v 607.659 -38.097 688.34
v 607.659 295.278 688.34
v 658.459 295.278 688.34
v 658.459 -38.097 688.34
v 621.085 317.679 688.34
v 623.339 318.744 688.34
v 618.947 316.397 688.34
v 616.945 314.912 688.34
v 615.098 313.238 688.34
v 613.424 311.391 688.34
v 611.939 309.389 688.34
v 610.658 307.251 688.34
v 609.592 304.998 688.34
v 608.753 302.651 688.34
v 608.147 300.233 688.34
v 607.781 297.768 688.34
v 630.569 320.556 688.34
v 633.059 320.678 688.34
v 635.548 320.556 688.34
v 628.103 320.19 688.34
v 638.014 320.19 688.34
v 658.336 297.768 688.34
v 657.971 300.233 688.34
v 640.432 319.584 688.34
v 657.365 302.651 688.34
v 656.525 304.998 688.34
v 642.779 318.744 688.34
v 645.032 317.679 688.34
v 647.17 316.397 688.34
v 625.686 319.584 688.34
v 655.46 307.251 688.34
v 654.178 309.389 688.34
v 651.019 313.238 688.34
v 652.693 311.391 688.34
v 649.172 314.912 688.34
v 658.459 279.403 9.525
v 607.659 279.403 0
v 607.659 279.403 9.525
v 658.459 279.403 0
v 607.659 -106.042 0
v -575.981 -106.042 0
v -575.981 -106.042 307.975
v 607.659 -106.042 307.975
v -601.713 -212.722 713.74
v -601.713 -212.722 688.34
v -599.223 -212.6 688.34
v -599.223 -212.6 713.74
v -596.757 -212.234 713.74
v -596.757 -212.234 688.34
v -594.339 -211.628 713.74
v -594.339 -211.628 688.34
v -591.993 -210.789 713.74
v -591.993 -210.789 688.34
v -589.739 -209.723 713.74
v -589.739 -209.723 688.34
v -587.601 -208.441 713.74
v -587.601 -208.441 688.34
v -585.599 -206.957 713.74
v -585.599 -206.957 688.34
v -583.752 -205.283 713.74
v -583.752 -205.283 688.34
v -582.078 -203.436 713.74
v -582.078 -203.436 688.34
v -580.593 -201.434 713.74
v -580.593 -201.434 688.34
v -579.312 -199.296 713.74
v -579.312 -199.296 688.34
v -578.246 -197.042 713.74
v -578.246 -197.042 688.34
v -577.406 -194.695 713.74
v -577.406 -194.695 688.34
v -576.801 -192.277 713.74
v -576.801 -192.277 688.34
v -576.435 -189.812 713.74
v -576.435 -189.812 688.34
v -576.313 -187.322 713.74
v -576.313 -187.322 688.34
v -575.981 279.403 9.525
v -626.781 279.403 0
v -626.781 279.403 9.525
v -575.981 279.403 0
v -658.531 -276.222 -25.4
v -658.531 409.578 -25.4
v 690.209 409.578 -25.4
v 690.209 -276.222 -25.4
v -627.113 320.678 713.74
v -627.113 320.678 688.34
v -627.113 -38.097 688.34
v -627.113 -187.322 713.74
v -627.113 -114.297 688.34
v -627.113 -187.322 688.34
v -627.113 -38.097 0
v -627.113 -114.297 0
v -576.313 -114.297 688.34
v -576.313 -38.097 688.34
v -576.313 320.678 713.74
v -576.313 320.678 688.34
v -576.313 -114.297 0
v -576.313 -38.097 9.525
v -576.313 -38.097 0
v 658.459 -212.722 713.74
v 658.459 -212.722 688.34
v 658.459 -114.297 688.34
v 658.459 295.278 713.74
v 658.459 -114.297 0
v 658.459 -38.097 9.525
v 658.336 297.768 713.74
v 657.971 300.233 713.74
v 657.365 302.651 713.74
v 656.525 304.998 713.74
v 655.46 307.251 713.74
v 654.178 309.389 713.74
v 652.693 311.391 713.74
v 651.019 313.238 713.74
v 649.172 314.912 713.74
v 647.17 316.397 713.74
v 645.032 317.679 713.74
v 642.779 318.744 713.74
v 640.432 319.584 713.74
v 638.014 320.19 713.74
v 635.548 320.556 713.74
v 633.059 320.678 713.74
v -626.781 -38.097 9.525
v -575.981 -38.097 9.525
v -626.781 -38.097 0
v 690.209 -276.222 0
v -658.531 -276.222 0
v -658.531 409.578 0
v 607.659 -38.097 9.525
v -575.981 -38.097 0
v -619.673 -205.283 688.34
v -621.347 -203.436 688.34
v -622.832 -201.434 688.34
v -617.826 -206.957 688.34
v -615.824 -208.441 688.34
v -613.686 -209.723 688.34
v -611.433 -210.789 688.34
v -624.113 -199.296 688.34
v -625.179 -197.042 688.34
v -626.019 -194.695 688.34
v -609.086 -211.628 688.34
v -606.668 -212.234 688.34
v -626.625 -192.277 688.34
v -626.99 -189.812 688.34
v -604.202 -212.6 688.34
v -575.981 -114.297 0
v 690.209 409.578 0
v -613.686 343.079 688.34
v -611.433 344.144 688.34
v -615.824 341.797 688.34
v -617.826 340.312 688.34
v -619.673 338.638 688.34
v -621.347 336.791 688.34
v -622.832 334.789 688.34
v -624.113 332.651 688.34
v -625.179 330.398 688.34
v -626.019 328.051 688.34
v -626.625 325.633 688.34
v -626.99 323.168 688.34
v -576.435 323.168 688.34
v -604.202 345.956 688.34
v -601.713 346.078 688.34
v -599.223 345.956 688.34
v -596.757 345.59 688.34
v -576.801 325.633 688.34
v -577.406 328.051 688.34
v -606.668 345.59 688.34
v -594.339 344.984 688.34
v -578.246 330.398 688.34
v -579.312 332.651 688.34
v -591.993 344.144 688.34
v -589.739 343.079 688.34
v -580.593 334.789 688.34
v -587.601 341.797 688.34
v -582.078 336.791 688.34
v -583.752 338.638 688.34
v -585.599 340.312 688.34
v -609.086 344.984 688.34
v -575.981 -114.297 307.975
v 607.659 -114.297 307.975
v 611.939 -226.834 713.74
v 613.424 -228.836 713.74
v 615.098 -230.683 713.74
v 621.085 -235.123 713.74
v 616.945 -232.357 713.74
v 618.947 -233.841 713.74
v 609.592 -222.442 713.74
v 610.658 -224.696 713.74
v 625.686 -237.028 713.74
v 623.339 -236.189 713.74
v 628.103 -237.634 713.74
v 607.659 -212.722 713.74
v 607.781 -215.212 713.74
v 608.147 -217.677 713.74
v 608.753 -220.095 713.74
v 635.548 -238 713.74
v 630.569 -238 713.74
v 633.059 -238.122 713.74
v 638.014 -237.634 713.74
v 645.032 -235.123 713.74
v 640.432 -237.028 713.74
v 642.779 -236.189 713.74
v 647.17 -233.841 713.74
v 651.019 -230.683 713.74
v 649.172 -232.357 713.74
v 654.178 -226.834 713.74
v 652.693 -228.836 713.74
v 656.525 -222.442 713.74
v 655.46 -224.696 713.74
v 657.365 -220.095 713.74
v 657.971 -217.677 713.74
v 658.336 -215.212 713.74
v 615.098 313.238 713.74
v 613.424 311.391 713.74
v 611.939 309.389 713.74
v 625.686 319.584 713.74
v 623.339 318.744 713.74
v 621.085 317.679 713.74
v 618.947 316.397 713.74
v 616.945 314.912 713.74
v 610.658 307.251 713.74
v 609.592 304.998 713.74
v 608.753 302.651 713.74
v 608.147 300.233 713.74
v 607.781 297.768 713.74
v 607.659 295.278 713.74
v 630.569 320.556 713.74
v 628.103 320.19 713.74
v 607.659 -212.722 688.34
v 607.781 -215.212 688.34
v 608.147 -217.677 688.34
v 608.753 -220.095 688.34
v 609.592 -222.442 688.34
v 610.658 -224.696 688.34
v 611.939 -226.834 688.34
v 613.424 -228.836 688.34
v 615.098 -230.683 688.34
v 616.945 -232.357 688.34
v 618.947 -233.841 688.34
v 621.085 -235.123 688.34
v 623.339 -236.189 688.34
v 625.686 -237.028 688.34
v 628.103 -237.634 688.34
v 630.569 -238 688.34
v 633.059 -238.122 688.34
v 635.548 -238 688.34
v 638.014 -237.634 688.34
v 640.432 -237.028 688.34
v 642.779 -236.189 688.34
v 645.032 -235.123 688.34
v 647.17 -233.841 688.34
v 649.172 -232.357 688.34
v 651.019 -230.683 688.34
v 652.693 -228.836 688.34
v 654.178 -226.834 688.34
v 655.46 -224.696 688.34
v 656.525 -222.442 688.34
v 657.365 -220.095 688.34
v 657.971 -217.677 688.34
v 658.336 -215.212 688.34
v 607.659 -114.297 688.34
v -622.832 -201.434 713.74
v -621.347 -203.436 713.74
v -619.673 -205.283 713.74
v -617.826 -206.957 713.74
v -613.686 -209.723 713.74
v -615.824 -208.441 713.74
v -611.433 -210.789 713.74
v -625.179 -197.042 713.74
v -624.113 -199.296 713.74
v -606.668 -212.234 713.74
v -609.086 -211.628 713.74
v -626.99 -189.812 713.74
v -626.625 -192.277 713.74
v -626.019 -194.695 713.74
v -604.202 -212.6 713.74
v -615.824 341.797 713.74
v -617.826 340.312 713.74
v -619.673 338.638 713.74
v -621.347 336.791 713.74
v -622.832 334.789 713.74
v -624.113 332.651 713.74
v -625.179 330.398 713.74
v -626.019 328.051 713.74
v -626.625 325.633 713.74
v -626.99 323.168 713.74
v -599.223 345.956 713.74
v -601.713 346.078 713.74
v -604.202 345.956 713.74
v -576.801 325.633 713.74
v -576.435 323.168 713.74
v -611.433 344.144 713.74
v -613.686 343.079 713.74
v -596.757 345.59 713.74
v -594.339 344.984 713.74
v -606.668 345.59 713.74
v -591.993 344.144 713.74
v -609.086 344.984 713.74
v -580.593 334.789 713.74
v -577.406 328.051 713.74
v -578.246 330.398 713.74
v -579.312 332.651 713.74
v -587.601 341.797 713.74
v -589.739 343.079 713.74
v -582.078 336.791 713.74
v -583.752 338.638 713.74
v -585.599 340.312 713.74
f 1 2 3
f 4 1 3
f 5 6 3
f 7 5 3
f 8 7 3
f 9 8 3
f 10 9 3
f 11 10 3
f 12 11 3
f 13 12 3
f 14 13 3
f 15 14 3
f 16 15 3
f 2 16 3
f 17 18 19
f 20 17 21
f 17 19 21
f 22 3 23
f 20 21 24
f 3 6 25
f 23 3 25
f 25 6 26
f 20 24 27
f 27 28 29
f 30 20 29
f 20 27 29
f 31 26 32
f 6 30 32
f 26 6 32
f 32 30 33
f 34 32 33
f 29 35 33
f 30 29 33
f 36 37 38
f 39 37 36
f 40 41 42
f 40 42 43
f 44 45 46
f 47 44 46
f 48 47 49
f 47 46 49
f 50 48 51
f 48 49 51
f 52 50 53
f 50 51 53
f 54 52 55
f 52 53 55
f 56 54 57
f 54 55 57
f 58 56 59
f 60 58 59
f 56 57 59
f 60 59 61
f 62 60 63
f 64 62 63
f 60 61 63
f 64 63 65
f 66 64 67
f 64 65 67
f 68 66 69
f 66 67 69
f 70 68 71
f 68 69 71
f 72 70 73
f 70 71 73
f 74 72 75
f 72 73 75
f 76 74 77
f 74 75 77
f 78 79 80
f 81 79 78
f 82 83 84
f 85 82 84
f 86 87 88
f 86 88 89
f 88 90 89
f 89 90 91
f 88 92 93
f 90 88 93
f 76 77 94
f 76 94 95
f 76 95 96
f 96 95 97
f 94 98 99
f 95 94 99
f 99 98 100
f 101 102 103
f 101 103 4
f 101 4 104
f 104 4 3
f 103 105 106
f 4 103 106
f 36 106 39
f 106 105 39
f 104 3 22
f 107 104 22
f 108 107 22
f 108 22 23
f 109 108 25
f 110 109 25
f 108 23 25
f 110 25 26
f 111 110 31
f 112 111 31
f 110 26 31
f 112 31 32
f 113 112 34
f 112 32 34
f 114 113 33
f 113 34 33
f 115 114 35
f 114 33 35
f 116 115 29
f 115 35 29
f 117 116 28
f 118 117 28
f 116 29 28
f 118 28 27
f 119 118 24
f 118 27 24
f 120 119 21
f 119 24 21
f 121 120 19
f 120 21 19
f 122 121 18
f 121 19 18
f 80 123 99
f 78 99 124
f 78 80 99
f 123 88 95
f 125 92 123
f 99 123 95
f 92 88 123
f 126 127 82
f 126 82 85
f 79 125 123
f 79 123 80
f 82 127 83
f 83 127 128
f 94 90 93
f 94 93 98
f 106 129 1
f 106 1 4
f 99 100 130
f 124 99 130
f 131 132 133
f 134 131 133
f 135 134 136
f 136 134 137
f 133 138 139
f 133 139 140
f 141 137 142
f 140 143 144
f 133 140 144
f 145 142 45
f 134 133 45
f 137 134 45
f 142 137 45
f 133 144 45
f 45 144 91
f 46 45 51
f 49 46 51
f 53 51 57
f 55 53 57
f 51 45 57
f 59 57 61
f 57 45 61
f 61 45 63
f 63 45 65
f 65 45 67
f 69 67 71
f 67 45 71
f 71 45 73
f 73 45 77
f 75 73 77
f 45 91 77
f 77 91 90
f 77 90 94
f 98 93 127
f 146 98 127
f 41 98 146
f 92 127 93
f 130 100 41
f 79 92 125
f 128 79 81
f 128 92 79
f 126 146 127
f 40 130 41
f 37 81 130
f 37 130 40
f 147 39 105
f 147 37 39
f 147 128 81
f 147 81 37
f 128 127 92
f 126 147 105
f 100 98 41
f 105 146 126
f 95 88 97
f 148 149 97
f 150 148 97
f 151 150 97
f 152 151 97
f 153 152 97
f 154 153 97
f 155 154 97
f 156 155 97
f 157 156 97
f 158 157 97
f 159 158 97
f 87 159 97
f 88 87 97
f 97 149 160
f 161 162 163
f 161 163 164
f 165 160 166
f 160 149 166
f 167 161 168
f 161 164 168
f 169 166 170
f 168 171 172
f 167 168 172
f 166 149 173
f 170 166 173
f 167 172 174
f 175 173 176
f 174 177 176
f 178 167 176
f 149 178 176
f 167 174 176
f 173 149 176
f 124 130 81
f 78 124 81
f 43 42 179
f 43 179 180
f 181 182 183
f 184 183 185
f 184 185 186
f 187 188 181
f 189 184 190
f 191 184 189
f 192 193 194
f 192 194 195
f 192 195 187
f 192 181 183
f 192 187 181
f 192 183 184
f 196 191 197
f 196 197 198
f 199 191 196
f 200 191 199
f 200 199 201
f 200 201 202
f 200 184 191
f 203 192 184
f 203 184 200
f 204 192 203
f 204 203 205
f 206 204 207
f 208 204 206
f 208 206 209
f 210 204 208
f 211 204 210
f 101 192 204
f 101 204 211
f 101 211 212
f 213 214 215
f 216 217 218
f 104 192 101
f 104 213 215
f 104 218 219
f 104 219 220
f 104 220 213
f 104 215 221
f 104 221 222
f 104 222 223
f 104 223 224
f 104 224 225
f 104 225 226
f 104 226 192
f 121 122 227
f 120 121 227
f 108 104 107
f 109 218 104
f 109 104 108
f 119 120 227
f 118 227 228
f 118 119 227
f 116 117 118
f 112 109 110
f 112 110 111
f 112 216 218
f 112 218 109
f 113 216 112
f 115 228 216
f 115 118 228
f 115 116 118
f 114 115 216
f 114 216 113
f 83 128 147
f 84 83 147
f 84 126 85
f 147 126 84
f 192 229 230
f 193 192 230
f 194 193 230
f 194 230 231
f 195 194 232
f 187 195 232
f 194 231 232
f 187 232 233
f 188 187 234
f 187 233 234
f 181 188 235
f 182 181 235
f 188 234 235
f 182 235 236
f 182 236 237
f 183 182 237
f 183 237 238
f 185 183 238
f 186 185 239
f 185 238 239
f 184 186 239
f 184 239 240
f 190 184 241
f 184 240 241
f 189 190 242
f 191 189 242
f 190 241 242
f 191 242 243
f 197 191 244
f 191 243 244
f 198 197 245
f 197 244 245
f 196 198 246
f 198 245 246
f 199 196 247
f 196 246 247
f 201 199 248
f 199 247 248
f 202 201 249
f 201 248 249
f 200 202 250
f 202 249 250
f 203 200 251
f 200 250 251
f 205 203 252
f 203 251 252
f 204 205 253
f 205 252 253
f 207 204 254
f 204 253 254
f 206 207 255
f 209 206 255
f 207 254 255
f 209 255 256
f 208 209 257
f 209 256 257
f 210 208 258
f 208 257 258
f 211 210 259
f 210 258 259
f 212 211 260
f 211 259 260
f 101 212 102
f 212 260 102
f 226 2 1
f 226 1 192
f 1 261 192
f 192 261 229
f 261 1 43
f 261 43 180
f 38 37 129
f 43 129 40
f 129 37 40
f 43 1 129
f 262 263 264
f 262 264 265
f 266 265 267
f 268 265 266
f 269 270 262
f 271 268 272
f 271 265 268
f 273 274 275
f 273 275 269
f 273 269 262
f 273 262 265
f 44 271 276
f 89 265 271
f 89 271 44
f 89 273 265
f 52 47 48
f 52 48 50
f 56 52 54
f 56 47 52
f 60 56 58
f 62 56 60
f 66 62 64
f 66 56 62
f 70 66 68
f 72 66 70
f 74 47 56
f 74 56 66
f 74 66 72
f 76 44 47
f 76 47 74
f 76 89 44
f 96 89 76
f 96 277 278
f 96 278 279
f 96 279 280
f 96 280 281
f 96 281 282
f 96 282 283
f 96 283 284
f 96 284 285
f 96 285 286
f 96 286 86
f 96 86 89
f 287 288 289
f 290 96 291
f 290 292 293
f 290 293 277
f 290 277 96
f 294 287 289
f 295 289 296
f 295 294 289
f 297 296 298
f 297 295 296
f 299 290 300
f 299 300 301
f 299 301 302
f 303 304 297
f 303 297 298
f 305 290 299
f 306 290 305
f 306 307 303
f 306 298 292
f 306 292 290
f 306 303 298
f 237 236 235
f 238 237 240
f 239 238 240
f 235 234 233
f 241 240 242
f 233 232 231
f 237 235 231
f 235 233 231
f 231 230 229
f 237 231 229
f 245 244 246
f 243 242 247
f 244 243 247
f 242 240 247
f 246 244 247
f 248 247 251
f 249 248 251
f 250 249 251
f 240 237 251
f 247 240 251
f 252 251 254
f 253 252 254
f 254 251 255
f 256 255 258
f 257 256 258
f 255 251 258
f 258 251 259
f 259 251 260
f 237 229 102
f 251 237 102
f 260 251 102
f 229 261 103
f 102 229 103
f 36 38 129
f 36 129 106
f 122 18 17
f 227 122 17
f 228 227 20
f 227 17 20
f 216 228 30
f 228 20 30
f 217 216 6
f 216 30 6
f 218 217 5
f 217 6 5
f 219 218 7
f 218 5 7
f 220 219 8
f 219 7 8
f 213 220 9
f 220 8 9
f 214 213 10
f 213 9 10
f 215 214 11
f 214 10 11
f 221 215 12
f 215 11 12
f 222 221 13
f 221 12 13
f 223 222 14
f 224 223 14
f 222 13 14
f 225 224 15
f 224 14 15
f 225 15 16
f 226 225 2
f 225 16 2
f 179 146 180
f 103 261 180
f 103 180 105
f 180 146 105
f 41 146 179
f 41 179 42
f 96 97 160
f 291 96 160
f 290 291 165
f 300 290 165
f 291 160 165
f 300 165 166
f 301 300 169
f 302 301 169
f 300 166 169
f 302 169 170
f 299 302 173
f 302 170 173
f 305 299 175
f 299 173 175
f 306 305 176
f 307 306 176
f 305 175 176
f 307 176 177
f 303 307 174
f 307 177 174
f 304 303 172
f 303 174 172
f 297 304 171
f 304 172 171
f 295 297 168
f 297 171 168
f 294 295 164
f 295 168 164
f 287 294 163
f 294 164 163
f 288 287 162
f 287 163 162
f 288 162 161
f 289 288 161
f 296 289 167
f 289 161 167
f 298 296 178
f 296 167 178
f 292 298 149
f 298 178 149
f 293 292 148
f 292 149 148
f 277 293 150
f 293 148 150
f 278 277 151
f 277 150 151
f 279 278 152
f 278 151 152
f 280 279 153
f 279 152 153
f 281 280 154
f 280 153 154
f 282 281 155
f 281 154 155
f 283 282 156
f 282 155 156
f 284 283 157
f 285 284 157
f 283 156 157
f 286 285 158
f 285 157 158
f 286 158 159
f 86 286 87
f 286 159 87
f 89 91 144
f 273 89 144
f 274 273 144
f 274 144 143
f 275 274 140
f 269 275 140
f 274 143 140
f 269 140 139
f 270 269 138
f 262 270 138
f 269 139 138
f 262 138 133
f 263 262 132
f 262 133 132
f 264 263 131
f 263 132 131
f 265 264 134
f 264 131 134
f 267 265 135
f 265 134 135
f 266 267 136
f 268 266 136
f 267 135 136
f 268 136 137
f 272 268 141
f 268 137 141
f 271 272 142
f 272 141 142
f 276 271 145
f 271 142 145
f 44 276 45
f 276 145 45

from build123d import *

# Parameters (mm, degrees)
F0_W      = 1348.74
F0_H      = 685.8
F1_DEPTH  = 25.4
F4_W      = 50.8
F4_H      = 317.5
F5_DEPTH  = 9.525
F7_W      = 50.8
F7_H      = 76.2
F8_DEPTH  = 688.34
F10_DEPTH = 25.4
F12_DEPTH = 25.4
F13_W     = 1183.64
F13_H     = 8.255
F14_DEPTH = 307.975


with BuildPart() as f1:
    # F0 (on Top) → F1 (new body)
    with BuildSketch(Plane.XY):
        with Locations((15.8387869596, 66.6778717405)):
            Rectangle(F0_W, F0_H)
    extrude(amount=-F1_DEPTH)

    # F4 (on face) → F5 (join)
    with BuildSketch(Plane.XY):
        with Locations((-601.3812130404, 120.6528717405)):
            Rectangle(F4_W, F4_H)
        with Locations((633.0587869596, 120.6528717405)):
            Rectangle(F4_W, F4_H)
    extrude(amount=F5_DEPTH)

    # F7 (on face) → F8 (join)
    with BuildSketch(Plane.XY):
        with Locations((-601.7126866341, -76.1971282595)):
            Rectangle(F7_W, F7_H)
        with Locations((633.0587869596, -76.1971282595)):
            Rectangle(F7_W, F7_H)
    extrude(amount=F8_DEPTH)

    # F9 (on face) → F10 (join)
    with BuildSketch(Plane.XY.offset(688.34)):
        with BuildLine():
            ThreePointArc((-601.7126866341, -212.7221282595), (-583.7521743919, -205.2826405017), (-576.3126866341, -187.3221282595))
            Line((-576.3126866341, -187.3221282595), (-576.3126866341, 320.6778717405))
            ThreePointArc((-576.3126866341, 320.6778717405), (-583.7521743919, 338.6383839826), (-601.7126866341, 346.0778717405))
            ThreePointArc((-601.7126866341, 346.0778717405), (-619.6731988762, 338.6383839826), (-627.1126866341, 320.6778717405))
            Line((-627.1126866341, 320.6778717405), (-627.1126866341, -187.3221282595))
            ThreePointArc((-627.1126866341, -187.3221282595), (-619.6731988762, -205.2826405017), (-601.7126866341, -212.7221282595))
        make_face()
    extrude(amount=F10_DEPTH)

    # F11 (on face) → F12 (join)
    with BuildSketch(Plane.XY.offset(688.34)):
        with BuildLine():
            ThreePointArc((607.6587869596, -212.7221282595), (633.0587869596, -238.1221282595), (658.4587869596, -212.7221282595))
            Line((658.4587869596, -212.7221282595), (658.4587869596, 295.2778717405))
            ThreePointArc((658.4587869596, 295.2778717405), (651.0192992018, 313.2383839826), (633.0587869596, 320.6778717405))
            ThreePointArc((633.0587869596, 320.6778717405), (615.0982747175, 313.2383839826), (607.6587869596, 295.2778717405))
            Line((607.6587869596, 295.2778717405), (607.6587869596, -212.7221282595))
        make_face()
    extrude(amount=F12_DEPTH)

    # F13 (on face) → F14 (join)
    with BuildSketch(Plane.XY):
        with Locations((15.8387869596, -110.1696282595)):
            Rectangle(F13_W, F13_H)
    extrude(amount=F14_DEPTH)


solid = f1.part
